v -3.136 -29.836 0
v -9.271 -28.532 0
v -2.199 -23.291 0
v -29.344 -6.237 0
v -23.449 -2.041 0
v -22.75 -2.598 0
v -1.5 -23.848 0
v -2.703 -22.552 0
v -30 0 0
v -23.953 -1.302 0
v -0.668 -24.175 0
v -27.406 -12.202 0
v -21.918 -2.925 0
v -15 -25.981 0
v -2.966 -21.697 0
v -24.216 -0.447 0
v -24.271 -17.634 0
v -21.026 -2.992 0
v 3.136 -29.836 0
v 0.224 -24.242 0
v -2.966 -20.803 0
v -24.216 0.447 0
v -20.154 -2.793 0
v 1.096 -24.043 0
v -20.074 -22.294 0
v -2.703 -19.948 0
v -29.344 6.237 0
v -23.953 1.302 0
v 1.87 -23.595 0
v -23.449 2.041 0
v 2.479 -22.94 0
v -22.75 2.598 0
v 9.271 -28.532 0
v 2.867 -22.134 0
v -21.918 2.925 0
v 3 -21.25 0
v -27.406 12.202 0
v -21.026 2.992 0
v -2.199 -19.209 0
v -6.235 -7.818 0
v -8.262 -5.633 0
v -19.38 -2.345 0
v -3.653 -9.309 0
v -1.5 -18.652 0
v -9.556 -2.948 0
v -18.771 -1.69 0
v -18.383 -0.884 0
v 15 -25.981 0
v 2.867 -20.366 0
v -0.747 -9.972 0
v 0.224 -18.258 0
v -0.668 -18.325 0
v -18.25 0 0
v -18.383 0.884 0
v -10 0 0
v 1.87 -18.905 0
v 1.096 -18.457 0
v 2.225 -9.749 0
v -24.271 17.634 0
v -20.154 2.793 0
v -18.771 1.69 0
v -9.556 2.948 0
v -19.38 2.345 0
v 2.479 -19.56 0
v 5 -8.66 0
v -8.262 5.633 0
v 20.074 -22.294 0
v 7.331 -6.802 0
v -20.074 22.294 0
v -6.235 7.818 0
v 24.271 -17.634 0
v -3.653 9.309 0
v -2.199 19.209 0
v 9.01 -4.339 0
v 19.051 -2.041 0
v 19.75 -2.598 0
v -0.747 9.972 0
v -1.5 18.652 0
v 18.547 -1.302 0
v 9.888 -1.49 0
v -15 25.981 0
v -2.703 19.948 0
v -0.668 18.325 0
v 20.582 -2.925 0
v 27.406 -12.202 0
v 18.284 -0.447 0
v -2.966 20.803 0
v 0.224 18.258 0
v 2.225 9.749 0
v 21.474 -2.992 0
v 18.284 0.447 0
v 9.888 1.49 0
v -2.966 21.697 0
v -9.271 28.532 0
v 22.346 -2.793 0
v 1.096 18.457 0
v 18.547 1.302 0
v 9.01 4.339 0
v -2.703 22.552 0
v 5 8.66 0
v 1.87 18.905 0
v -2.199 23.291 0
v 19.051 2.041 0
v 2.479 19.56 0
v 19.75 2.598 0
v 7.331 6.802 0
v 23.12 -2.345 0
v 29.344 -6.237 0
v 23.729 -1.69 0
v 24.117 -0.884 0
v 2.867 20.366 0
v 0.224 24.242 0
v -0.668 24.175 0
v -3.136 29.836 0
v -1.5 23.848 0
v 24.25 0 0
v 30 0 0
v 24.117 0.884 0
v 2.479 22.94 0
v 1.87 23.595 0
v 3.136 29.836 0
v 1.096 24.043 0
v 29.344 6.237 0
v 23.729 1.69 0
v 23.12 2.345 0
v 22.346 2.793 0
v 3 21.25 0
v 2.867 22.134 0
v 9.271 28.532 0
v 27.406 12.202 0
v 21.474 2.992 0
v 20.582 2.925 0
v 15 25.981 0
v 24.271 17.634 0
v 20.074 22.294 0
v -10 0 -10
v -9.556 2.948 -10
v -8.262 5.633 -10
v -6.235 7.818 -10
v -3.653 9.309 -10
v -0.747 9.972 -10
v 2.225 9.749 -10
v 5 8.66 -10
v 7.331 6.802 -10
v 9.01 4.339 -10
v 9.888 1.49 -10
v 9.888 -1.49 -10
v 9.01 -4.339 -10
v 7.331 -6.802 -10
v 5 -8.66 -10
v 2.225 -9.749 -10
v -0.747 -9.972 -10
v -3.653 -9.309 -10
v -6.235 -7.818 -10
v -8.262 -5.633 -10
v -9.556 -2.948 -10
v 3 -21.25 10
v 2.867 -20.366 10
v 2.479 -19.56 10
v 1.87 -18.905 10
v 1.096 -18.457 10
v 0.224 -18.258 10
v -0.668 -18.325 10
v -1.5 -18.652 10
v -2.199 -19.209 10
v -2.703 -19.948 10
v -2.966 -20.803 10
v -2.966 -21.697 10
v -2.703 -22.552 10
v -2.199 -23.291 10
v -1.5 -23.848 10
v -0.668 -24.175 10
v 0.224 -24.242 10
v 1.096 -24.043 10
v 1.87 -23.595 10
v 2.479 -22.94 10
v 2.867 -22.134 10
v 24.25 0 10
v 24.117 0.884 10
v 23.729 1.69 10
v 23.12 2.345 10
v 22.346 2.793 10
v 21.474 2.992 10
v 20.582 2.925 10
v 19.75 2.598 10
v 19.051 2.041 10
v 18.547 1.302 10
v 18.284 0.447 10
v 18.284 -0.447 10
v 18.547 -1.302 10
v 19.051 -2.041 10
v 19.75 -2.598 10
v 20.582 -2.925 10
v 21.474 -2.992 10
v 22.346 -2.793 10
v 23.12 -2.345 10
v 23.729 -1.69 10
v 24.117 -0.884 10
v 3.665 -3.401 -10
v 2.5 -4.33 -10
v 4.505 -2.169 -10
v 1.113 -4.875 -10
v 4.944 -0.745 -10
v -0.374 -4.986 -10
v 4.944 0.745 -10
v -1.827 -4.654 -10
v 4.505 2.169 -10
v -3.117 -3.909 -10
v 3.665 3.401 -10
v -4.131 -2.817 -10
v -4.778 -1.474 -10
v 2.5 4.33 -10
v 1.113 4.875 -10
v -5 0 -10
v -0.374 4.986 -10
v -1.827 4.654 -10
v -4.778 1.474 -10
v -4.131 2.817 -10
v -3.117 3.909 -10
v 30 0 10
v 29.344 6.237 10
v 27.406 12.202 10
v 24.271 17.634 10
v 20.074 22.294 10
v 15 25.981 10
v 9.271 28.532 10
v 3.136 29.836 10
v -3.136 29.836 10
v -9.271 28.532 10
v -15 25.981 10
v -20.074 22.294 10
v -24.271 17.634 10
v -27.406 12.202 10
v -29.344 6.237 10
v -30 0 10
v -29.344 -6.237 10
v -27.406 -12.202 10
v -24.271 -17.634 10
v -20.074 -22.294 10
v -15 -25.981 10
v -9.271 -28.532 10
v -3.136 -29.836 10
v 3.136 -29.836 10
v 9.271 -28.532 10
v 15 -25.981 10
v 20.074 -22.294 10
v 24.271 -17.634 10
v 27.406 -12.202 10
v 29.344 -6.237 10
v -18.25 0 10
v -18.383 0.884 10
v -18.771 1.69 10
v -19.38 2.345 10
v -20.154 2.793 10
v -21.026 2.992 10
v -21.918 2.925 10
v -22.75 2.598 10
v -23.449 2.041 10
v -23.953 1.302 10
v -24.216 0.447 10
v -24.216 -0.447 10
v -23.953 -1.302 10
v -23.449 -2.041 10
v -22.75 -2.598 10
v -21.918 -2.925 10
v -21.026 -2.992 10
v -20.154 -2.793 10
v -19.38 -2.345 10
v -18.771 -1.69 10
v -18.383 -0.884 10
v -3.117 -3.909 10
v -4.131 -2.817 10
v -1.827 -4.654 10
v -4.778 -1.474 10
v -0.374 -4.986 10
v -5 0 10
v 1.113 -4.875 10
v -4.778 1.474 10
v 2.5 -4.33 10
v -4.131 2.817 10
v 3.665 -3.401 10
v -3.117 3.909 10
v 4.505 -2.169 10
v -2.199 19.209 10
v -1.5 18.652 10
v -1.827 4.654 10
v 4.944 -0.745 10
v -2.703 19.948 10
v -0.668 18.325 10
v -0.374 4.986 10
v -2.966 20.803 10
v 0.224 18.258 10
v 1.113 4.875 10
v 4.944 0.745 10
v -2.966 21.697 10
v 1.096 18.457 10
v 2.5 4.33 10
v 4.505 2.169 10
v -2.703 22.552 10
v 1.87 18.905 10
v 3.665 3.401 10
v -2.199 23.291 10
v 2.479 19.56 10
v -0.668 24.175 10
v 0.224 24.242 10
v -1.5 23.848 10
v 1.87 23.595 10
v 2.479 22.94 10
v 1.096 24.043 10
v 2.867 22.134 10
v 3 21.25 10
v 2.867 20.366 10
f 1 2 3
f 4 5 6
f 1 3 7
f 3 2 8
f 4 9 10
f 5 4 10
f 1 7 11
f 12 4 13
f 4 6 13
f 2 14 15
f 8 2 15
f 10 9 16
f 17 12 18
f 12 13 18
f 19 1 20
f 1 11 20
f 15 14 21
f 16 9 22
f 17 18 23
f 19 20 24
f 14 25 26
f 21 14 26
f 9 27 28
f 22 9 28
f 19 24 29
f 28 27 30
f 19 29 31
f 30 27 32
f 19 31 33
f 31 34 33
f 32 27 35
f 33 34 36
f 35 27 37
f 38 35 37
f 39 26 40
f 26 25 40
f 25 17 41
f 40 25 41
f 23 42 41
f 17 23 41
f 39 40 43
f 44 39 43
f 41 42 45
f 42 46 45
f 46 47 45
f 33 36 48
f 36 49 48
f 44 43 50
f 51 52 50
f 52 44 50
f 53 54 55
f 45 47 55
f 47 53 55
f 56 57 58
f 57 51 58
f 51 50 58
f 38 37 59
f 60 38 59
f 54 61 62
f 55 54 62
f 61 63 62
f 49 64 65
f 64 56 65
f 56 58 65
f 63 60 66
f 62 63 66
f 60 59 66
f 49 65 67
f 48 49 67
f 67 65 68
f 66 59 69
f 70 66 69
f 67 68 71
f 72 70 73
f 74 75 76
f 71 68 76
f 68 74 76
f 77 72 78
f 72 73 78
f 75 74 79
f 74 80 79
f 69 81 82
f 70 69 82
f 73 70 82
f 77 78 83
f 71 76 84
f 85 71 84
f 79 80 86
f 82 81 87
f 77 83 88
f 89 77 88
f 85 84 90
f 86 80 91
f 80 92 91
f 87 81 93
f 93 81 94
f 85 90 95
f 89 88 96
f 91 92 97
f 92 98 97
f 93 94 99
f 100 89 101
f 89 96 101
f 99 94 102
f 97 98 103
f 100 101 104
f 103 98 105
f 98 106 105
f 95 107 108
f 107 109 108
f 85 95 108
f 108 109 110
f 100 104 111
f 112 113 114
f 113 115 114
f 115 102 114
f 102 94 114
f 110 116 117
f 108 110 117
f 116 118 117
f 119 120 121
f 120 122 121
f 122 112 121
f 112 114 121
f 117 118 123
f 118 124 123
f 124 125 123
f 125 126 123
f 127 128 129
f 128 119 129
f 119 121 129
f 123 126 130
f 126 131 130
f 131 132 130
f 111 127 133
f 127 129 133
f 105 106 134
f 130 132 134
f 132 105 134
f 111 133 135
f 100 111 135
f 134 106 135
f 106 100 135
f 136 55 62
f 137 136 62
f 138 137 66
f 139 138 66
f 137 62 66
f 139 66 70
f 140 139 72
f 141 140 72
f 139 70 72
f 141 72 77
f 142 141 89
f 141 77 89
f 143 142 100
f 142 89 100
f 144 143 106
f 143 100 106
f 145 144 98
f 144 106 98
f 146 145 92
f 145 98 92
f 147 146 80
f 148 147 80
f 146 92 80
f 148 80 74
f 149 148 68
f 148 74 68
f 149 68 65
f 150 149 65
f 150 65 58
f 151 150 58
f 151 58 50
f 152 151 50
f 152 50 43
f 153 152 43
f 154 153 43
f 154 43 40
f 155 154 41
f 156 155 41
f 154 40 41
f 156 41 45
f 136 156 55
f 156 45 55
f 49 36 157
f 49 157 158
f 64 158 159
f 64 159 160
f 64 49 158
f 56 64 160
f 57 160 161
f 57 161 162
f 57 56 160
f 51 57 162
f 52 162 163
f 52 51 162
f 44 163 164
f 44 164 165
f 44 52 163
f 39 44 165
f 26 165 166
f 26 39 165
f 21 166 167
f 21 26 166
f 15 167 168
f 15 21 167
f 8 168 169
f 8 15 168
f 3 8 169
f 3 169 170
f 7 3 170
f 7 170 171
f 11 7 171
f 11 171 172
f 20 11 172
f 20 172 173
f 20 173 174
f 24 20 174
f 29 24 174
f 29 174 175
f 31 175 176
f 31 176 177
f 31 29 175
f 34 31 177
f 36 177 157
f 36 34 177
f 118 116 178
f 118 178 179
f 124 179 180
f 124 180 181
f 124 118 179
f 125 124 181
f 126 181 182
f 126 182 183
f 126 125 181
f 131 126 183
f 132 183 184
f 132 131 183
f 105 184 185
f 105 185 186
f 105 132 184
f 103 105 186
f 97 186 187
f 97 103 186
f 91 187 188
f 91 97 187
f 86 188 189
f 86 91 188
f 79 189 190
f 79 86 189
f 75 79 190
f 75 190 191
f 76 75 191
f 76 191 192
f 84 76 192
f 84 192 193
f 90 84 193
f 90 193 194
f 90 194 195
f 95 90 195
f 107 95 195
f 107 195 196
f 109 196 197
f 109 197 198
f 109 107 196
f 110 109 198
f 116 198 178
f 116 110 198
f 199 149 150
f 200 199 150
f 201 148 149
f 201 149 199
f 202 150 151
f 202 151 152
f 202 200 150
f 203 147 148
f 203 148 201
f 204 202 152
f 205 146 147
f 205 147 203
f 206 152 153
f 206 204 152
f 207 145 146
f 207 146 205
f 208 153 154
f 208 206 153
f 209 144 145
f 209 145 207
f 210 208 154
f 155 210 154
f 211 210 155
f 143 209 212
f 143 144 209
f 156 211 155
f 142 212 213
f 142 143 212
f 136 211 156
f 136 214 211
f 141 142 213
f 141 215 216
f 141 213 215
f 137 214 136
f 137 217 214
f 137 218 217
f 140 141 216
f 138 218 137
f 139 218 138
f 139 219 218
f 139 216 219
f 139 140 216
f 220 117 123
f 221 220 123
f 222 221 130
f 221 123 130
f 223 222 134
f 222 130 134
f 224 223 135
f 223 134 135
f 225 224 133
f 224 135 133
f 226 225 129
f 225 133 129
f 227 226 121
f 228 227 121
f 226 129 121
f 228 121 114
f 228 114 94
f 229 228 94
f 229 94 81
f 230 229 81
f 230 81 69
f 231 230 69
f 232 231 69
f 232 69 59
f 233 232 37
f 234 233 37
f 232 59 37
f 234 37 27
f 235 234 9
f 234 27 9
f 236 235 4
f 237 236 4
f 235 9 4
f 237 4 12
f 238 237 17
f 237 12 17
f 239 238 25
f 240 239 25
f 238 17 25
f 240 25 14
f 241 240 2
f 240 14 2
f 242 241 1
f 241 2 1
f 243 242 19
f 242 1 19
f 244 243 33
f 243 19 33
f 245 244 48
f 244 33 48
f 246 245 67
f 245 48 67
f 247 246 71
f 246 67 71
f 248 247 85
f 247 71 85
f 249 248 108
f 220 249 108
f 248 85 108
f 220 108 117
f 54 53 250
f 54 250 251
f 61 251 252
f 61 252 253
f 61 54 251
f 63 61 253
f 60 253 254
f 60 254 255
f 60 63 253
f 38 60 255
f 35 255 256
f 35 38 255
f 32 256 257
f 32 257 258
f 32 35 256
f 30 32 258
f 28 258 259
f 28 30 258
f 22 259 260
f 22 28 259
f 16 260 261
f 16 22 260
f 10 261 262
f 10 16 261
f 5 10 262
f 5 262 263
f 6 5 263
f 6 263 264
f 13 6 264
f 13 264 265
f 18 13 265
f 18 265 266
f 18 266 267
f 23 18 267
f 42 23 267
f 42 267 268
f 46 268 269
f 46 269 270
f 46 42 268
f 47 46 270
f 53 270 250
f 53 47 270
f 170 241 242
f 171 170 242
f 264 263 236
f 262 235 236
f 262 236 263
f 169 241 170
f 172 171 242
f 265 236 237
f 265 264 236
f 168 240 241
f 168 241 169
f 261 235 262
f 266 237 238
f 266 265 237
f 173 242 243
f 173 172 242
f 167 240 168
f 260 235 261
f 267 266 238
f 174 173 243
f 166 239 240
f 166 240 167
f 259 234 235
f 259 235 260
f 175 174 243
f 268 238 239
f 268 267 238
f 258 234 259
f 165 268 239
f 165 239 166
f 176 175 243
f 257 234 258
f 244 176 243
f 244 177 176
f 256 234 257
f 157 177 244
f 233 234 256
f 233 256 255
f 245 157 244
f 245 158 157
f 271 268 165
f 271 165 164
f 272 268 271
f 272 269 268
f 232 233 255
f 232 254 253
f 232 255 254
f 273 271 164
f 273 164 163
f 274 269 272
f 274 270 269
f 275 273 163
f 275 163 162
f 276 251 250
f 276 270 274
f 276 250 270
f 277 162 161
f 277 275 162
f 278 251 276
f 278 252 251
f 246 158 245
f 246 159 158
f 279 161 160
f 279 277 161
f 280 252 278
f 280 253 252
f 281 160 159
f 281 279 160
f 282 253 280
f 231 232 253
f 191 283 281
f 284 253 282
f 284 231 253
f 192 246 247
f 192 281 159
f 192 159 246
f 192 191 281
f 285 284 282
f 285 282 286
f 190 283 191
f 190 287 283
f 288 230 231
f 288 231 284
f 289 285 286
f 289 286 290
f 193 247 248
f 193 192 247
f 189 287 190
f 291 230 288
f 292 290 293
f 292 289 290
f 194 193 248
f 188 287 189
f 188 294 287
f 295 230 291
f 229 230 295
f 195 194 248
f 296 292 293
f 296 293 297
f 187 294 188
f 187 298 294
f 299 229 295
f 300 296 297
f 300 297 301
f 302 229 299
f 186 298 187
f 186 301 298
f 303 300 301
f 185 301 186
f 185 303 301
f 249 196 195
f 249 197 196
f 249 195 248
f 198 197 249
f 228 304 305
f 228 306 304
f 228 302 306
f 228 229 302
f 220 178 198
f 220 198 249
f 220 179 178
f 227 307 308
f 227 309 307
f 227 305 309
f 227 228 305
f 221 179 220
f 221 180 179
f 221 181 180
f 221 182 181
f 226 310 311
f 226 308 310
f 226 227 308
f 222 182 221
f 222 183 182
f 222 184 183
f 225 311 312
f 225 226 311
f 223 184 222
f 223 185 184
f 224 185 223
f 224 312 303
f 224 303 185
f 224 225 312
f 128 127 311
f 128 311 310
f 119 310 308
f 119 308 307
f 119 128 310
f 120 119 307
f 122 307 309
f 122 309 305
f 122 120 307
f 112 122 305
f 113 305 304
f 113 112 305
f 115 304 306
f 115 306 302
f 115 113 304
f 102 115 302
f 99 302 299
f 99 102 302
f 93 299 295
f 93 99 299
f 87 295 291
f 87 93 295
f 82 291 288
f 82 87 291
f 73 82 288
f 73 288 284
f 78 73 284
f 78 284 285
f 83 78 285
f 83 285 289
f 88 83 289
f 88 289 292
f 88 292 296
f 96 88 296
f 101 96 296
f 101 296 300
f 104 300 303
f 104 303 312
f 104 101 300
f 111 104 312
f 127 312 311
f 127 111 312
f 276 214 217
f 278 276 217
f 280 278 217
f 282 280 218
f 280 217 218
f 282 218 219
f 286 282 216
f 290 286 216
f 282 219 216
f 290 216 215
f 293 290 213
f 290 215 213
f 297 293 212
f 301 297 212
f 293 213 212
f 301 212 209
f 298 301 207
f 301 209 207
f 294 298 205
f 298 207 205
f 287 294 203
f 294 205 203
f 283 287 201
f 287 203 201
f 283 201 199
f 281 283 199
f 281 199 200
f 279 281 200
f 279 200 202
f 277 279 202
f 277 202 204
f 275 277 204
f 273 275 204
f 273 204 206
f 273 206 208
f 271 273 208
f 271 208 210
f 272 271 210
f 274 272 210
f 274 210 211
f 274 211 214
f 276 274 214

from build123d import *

# Parameters (mm, degrees)
SKETCH1_R           = 30
SKETCH1_R_2         = 3
BOSS_EXTRUDE3_DEPTH = 10
SKETCH2_R           = 10
BOSS_EXTRUDE4_DEPTH = 10
SKETCH3_R           = 5
CUT_EXTRUDE1_DEPTH  = 21


with BuildPart() as part:
    # Sketch1 → Boss-Extrude3 (new body)
    with BuildSketch(Plane.XY):
        Circle(SKETCH1_R)
        with Locations((0, 21.25)):
            Circle(SKETCH1_R_2, mode=Mode.SUBTRACT)
        with Locations((21.25, 0)):
            Circle(SKETCH1_R_2, mode=Mode.SUBTRACT)
        with Locations((0, -21.25)):
            Circle(SKETCH1_R_2, mode=Mode.SUBTRACT)
        with Locations((-21.25, 0)):
            Circle(SKETCH1_R_2, mode=Mode.SUBTRACT)
    extrude(amount=BOSS_EXTRUDE3_DEPTH)

    # Sketch2 → Boss-Extrude4 (add)
    with BuildSketch(Plane(origin=(0, 0, 0), x_dir=(-1, 0, 0), z_dir=(0, 0, -1))):
        Circle(SKETCH2_R)
    extrude(amount=BOSS_EXTRUDE4_DEPTH)

    # Sketch3 → Cut-Extrude1 (cut, through all)
    with BuildSketch(Plane(origin=(0, 0, -10), x_dir=(-1, 0, 0), z_dir=(0, 0, -1))):
        Circle(SKETCH3_R)
    extrude(amount=-CUT_EXTRUDE1_DEPTH, mode=Mode.SUBTRACT)


solid = part.part
